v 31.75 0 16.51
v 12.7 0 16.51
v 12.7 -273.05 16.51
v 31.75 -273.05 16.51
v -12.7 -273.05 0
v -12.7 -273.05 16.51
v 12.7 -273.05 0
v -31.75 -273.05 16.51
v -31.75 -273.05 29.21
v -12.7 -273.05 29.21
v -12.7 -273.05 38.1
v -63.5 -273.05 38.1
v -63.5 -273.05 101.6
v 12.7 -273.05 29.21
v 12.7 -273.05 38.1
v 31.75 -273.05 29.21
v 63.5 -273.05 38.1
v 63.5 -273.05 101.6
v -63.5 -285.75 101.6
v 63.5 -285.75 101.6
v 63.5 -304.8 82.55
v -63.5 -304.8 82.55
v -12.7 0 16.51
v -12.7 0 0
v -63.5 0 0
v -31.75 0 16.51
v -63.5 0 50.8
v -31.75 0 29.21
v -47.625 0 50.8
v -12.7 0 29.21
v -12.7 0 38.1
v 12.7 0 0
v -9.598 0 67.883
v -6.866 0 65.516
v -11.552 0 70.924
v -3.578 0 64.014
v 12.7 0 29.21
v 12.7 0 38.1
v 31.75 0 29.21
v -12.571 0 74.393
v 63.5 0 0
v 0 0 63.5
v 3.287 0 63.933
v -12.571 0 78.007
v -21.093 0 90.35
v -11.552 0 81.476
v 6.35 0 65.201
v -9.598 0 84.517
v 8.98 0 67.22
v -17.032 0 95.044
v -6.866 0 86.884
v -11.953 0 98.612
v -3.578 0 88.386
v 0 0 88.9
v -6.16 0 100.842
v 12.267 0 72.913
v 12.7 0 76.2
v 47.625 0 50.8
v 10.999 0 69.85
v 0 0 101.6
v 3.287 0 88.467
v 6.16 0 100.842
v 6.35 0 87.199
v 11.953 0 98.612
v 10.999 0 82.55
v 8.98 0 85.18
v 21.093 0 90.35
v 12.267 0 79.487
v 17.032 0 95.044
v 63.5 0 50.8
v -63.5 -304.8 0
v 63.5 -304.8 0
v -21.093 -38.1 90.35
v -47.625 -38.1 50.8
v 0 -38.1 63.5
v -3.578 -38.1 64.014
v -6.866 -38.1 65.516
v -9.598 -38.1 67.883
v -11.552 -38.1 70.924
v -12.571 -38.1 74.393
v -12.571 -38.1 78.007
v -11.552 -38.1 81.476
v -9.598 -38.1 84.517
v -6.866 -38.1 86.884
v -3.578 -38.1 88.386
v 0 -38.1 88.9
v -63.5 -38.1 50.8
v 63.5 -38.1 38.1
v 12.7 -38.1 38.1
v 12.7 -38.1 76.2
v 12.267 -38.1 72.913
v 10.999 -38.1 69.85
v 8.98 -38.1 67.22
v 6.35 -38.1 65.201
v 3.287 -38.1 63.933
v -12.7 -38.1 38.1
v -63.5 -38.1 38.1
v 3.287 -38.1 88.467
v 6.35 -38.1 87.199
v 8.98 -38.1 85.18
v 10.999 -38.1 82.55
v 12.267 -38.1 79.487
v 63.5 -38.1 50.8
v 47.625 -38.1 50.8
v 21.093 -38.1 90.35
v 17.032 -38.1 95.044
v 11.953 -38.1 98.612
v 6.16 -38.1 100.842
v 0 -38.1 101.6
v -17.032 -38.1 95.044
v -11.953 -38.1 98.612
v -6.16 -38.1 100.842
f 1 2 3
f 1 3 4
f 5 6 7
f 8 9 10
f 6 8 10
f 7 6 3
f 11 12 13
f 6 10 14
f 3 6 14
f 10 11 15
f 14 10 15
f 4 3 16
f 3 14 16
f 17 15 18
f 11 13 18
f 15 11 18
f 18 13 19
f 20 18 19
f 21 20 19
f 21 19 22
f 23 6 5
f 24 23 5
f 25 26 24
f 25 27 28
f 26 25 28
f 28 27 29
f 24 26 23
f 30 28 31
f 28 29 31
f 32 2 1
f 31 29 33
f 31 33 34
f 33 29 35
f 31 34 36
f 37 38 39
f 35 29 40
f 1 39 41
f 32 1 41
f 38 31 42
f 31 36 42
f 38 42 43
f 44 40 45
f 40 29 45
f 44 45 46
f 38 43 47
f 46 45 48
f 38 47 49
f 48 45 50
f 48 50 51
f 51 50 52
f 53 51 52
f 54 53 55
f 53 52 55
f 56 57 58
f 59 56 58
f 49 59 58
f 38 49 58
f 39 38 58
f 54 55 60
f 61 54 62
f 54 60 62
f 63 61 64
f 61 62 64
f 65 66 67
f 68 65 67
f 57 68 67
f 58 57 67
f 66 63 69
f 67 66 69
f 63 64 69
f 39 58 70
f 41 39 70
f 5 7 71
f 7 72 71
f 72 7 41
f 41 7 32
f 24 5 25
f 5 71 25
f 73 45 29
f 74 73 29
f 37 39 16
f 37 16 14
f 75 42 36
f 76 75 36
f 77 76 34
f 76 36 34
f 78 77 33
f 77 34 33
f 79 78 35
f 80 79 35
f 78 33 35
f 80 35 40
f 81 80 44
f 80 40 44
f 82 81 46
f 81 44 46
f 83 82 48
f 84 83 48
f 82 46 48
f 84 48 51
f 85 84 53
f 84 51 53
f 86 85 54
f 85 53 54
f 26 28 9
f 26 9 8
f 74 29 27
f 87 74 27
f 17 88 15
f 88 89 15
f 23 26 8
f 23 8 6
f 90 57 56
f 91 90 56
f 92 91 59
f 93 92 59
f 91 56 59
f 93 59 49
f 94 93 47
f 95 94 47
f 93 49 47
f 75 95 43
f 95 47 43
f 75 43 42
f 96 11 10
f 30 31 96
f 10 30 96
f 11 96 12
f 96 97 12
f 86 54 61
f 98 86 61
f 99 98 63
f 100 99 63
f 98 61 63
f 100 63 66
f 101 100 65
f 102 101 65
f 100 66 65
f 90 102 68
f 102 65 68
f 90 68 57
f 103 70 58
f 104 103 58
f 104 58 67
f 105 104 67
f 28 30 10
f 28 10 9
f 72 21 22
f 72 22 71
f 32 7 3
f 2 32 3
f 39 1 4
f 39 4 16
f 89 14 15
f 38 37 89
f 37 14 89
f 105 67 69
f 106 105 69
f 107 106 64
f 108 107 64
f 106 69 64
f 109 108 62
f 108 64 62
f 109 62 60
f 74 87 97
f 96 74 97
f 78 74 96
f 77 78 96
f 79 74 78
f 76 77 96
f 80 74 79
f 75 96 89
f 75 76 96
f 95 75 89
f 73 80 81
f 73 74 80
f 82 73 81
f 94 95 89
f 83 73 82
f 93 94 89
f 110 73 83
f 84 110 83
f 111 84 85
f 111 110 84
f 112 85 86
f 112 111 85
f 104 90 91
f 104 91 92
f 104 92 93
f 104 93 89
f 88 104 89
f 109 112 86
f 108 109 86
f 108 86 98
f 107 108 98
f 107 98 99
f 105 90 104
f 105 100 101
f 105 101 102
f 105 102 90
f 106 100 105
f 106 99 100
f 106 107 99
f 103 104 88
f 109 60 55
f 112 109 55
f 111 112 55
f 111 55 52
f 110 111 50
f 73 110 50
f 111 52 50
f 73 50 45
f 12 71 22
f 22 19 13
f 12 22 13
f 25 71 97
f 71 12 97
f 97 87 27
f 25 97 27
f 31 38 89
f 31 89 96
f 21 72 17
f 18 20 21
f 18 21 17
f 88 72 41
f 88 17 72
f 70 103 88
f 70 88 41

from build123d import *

# Parameters (mm, degrees)
F1_DEPTH      = 38.1
F3_DEPTH      = 63.5
F3_DEPTH_BACK = 63.5
F5_DEPTH      = 273.05


with BuildPart() as f1:
    # F0 (on Front) → F1 (new body)
    with BuildSketch(Plane.XZ):
        with BuildLine():
            Line((-63.5, 50.8), (-63.5, 0))
            Line((-63.5, 0), (0, 0))
            Line((0, 0), (0, 63.5))
            ThreePointArc((0, 63.5), (-12.7, 76.2), (0, 88.9))
            Line((0, 88.9), (0, 101.6))
            ThreePointArc((0, 101.6), (-11.9529411765, 98.6117647059), (-21.0934256055, 90.3501730104))
            Line((-21.0934256055, 90.3501730104), (-47.625, 50.8))
            Line((-47.625, 50.8), (-63.5, 50.8))
        make_face()
        with BuildLine():
            Line((0, 63.5), (0, 0))
            Line((0, 0), (63.5, 0))
            Line((63.5, 0), (63.5, 50.8))
            Line((63.5, 50.8), (47.625, 50.8))
            Line((47.625, 50.8), (21.0934256055, 90.3501730104))
            ThreePointArc((21.0934256055, 90.3501730104), (11.9529411765, 98.6117647059), (0, 101.6))
            Line((0, 101.6), (0, 88.9))
            ThreePointArc((0, 88.9), (8.9802561211, 85.1802561211), (12.7, 76.2))
            ThreePointArc((12.7, 76.2), (8.9802561211, 67.2197438789), (0, 63.5))
        make_face()
    extrude(amount=F1_DEPTH)

    # F2 (on Right) → F3 (join, two sides)
    with BuildSketch(Plane.YZ) as f3_sk:
        Polygon((-304.8, 0), (0, 0), (0, 38.1), (-273.05, 38.1), (-273.05, 101.6), (-285.75, 101.6), (-304.8, 82.55), align=None)
    extrude(amount=-F3_DEPTH)
    extrude(f3_sk.sketch, amount=F3_DEPTH_BACK)

    # F4 (on Front) → F5 (cut)
    with BuildSketch(Plane.XZ):
        Polygon((-12.7, 16.51), (-12.7, 0), (12.7, 0), (12.7, 16.51), (31.75, 16.51), (31.75, 29.21), (12.7, 29.21), (12.7, 38.1), (-12.7, 38.1), (-12.7, 29.21), (-31.75, 29.21), (-31.75, 16.51), align=None)
    extrude(amount=F5_DEPTH, mode=Mode.SUBTRACT)


solid = f1.part
